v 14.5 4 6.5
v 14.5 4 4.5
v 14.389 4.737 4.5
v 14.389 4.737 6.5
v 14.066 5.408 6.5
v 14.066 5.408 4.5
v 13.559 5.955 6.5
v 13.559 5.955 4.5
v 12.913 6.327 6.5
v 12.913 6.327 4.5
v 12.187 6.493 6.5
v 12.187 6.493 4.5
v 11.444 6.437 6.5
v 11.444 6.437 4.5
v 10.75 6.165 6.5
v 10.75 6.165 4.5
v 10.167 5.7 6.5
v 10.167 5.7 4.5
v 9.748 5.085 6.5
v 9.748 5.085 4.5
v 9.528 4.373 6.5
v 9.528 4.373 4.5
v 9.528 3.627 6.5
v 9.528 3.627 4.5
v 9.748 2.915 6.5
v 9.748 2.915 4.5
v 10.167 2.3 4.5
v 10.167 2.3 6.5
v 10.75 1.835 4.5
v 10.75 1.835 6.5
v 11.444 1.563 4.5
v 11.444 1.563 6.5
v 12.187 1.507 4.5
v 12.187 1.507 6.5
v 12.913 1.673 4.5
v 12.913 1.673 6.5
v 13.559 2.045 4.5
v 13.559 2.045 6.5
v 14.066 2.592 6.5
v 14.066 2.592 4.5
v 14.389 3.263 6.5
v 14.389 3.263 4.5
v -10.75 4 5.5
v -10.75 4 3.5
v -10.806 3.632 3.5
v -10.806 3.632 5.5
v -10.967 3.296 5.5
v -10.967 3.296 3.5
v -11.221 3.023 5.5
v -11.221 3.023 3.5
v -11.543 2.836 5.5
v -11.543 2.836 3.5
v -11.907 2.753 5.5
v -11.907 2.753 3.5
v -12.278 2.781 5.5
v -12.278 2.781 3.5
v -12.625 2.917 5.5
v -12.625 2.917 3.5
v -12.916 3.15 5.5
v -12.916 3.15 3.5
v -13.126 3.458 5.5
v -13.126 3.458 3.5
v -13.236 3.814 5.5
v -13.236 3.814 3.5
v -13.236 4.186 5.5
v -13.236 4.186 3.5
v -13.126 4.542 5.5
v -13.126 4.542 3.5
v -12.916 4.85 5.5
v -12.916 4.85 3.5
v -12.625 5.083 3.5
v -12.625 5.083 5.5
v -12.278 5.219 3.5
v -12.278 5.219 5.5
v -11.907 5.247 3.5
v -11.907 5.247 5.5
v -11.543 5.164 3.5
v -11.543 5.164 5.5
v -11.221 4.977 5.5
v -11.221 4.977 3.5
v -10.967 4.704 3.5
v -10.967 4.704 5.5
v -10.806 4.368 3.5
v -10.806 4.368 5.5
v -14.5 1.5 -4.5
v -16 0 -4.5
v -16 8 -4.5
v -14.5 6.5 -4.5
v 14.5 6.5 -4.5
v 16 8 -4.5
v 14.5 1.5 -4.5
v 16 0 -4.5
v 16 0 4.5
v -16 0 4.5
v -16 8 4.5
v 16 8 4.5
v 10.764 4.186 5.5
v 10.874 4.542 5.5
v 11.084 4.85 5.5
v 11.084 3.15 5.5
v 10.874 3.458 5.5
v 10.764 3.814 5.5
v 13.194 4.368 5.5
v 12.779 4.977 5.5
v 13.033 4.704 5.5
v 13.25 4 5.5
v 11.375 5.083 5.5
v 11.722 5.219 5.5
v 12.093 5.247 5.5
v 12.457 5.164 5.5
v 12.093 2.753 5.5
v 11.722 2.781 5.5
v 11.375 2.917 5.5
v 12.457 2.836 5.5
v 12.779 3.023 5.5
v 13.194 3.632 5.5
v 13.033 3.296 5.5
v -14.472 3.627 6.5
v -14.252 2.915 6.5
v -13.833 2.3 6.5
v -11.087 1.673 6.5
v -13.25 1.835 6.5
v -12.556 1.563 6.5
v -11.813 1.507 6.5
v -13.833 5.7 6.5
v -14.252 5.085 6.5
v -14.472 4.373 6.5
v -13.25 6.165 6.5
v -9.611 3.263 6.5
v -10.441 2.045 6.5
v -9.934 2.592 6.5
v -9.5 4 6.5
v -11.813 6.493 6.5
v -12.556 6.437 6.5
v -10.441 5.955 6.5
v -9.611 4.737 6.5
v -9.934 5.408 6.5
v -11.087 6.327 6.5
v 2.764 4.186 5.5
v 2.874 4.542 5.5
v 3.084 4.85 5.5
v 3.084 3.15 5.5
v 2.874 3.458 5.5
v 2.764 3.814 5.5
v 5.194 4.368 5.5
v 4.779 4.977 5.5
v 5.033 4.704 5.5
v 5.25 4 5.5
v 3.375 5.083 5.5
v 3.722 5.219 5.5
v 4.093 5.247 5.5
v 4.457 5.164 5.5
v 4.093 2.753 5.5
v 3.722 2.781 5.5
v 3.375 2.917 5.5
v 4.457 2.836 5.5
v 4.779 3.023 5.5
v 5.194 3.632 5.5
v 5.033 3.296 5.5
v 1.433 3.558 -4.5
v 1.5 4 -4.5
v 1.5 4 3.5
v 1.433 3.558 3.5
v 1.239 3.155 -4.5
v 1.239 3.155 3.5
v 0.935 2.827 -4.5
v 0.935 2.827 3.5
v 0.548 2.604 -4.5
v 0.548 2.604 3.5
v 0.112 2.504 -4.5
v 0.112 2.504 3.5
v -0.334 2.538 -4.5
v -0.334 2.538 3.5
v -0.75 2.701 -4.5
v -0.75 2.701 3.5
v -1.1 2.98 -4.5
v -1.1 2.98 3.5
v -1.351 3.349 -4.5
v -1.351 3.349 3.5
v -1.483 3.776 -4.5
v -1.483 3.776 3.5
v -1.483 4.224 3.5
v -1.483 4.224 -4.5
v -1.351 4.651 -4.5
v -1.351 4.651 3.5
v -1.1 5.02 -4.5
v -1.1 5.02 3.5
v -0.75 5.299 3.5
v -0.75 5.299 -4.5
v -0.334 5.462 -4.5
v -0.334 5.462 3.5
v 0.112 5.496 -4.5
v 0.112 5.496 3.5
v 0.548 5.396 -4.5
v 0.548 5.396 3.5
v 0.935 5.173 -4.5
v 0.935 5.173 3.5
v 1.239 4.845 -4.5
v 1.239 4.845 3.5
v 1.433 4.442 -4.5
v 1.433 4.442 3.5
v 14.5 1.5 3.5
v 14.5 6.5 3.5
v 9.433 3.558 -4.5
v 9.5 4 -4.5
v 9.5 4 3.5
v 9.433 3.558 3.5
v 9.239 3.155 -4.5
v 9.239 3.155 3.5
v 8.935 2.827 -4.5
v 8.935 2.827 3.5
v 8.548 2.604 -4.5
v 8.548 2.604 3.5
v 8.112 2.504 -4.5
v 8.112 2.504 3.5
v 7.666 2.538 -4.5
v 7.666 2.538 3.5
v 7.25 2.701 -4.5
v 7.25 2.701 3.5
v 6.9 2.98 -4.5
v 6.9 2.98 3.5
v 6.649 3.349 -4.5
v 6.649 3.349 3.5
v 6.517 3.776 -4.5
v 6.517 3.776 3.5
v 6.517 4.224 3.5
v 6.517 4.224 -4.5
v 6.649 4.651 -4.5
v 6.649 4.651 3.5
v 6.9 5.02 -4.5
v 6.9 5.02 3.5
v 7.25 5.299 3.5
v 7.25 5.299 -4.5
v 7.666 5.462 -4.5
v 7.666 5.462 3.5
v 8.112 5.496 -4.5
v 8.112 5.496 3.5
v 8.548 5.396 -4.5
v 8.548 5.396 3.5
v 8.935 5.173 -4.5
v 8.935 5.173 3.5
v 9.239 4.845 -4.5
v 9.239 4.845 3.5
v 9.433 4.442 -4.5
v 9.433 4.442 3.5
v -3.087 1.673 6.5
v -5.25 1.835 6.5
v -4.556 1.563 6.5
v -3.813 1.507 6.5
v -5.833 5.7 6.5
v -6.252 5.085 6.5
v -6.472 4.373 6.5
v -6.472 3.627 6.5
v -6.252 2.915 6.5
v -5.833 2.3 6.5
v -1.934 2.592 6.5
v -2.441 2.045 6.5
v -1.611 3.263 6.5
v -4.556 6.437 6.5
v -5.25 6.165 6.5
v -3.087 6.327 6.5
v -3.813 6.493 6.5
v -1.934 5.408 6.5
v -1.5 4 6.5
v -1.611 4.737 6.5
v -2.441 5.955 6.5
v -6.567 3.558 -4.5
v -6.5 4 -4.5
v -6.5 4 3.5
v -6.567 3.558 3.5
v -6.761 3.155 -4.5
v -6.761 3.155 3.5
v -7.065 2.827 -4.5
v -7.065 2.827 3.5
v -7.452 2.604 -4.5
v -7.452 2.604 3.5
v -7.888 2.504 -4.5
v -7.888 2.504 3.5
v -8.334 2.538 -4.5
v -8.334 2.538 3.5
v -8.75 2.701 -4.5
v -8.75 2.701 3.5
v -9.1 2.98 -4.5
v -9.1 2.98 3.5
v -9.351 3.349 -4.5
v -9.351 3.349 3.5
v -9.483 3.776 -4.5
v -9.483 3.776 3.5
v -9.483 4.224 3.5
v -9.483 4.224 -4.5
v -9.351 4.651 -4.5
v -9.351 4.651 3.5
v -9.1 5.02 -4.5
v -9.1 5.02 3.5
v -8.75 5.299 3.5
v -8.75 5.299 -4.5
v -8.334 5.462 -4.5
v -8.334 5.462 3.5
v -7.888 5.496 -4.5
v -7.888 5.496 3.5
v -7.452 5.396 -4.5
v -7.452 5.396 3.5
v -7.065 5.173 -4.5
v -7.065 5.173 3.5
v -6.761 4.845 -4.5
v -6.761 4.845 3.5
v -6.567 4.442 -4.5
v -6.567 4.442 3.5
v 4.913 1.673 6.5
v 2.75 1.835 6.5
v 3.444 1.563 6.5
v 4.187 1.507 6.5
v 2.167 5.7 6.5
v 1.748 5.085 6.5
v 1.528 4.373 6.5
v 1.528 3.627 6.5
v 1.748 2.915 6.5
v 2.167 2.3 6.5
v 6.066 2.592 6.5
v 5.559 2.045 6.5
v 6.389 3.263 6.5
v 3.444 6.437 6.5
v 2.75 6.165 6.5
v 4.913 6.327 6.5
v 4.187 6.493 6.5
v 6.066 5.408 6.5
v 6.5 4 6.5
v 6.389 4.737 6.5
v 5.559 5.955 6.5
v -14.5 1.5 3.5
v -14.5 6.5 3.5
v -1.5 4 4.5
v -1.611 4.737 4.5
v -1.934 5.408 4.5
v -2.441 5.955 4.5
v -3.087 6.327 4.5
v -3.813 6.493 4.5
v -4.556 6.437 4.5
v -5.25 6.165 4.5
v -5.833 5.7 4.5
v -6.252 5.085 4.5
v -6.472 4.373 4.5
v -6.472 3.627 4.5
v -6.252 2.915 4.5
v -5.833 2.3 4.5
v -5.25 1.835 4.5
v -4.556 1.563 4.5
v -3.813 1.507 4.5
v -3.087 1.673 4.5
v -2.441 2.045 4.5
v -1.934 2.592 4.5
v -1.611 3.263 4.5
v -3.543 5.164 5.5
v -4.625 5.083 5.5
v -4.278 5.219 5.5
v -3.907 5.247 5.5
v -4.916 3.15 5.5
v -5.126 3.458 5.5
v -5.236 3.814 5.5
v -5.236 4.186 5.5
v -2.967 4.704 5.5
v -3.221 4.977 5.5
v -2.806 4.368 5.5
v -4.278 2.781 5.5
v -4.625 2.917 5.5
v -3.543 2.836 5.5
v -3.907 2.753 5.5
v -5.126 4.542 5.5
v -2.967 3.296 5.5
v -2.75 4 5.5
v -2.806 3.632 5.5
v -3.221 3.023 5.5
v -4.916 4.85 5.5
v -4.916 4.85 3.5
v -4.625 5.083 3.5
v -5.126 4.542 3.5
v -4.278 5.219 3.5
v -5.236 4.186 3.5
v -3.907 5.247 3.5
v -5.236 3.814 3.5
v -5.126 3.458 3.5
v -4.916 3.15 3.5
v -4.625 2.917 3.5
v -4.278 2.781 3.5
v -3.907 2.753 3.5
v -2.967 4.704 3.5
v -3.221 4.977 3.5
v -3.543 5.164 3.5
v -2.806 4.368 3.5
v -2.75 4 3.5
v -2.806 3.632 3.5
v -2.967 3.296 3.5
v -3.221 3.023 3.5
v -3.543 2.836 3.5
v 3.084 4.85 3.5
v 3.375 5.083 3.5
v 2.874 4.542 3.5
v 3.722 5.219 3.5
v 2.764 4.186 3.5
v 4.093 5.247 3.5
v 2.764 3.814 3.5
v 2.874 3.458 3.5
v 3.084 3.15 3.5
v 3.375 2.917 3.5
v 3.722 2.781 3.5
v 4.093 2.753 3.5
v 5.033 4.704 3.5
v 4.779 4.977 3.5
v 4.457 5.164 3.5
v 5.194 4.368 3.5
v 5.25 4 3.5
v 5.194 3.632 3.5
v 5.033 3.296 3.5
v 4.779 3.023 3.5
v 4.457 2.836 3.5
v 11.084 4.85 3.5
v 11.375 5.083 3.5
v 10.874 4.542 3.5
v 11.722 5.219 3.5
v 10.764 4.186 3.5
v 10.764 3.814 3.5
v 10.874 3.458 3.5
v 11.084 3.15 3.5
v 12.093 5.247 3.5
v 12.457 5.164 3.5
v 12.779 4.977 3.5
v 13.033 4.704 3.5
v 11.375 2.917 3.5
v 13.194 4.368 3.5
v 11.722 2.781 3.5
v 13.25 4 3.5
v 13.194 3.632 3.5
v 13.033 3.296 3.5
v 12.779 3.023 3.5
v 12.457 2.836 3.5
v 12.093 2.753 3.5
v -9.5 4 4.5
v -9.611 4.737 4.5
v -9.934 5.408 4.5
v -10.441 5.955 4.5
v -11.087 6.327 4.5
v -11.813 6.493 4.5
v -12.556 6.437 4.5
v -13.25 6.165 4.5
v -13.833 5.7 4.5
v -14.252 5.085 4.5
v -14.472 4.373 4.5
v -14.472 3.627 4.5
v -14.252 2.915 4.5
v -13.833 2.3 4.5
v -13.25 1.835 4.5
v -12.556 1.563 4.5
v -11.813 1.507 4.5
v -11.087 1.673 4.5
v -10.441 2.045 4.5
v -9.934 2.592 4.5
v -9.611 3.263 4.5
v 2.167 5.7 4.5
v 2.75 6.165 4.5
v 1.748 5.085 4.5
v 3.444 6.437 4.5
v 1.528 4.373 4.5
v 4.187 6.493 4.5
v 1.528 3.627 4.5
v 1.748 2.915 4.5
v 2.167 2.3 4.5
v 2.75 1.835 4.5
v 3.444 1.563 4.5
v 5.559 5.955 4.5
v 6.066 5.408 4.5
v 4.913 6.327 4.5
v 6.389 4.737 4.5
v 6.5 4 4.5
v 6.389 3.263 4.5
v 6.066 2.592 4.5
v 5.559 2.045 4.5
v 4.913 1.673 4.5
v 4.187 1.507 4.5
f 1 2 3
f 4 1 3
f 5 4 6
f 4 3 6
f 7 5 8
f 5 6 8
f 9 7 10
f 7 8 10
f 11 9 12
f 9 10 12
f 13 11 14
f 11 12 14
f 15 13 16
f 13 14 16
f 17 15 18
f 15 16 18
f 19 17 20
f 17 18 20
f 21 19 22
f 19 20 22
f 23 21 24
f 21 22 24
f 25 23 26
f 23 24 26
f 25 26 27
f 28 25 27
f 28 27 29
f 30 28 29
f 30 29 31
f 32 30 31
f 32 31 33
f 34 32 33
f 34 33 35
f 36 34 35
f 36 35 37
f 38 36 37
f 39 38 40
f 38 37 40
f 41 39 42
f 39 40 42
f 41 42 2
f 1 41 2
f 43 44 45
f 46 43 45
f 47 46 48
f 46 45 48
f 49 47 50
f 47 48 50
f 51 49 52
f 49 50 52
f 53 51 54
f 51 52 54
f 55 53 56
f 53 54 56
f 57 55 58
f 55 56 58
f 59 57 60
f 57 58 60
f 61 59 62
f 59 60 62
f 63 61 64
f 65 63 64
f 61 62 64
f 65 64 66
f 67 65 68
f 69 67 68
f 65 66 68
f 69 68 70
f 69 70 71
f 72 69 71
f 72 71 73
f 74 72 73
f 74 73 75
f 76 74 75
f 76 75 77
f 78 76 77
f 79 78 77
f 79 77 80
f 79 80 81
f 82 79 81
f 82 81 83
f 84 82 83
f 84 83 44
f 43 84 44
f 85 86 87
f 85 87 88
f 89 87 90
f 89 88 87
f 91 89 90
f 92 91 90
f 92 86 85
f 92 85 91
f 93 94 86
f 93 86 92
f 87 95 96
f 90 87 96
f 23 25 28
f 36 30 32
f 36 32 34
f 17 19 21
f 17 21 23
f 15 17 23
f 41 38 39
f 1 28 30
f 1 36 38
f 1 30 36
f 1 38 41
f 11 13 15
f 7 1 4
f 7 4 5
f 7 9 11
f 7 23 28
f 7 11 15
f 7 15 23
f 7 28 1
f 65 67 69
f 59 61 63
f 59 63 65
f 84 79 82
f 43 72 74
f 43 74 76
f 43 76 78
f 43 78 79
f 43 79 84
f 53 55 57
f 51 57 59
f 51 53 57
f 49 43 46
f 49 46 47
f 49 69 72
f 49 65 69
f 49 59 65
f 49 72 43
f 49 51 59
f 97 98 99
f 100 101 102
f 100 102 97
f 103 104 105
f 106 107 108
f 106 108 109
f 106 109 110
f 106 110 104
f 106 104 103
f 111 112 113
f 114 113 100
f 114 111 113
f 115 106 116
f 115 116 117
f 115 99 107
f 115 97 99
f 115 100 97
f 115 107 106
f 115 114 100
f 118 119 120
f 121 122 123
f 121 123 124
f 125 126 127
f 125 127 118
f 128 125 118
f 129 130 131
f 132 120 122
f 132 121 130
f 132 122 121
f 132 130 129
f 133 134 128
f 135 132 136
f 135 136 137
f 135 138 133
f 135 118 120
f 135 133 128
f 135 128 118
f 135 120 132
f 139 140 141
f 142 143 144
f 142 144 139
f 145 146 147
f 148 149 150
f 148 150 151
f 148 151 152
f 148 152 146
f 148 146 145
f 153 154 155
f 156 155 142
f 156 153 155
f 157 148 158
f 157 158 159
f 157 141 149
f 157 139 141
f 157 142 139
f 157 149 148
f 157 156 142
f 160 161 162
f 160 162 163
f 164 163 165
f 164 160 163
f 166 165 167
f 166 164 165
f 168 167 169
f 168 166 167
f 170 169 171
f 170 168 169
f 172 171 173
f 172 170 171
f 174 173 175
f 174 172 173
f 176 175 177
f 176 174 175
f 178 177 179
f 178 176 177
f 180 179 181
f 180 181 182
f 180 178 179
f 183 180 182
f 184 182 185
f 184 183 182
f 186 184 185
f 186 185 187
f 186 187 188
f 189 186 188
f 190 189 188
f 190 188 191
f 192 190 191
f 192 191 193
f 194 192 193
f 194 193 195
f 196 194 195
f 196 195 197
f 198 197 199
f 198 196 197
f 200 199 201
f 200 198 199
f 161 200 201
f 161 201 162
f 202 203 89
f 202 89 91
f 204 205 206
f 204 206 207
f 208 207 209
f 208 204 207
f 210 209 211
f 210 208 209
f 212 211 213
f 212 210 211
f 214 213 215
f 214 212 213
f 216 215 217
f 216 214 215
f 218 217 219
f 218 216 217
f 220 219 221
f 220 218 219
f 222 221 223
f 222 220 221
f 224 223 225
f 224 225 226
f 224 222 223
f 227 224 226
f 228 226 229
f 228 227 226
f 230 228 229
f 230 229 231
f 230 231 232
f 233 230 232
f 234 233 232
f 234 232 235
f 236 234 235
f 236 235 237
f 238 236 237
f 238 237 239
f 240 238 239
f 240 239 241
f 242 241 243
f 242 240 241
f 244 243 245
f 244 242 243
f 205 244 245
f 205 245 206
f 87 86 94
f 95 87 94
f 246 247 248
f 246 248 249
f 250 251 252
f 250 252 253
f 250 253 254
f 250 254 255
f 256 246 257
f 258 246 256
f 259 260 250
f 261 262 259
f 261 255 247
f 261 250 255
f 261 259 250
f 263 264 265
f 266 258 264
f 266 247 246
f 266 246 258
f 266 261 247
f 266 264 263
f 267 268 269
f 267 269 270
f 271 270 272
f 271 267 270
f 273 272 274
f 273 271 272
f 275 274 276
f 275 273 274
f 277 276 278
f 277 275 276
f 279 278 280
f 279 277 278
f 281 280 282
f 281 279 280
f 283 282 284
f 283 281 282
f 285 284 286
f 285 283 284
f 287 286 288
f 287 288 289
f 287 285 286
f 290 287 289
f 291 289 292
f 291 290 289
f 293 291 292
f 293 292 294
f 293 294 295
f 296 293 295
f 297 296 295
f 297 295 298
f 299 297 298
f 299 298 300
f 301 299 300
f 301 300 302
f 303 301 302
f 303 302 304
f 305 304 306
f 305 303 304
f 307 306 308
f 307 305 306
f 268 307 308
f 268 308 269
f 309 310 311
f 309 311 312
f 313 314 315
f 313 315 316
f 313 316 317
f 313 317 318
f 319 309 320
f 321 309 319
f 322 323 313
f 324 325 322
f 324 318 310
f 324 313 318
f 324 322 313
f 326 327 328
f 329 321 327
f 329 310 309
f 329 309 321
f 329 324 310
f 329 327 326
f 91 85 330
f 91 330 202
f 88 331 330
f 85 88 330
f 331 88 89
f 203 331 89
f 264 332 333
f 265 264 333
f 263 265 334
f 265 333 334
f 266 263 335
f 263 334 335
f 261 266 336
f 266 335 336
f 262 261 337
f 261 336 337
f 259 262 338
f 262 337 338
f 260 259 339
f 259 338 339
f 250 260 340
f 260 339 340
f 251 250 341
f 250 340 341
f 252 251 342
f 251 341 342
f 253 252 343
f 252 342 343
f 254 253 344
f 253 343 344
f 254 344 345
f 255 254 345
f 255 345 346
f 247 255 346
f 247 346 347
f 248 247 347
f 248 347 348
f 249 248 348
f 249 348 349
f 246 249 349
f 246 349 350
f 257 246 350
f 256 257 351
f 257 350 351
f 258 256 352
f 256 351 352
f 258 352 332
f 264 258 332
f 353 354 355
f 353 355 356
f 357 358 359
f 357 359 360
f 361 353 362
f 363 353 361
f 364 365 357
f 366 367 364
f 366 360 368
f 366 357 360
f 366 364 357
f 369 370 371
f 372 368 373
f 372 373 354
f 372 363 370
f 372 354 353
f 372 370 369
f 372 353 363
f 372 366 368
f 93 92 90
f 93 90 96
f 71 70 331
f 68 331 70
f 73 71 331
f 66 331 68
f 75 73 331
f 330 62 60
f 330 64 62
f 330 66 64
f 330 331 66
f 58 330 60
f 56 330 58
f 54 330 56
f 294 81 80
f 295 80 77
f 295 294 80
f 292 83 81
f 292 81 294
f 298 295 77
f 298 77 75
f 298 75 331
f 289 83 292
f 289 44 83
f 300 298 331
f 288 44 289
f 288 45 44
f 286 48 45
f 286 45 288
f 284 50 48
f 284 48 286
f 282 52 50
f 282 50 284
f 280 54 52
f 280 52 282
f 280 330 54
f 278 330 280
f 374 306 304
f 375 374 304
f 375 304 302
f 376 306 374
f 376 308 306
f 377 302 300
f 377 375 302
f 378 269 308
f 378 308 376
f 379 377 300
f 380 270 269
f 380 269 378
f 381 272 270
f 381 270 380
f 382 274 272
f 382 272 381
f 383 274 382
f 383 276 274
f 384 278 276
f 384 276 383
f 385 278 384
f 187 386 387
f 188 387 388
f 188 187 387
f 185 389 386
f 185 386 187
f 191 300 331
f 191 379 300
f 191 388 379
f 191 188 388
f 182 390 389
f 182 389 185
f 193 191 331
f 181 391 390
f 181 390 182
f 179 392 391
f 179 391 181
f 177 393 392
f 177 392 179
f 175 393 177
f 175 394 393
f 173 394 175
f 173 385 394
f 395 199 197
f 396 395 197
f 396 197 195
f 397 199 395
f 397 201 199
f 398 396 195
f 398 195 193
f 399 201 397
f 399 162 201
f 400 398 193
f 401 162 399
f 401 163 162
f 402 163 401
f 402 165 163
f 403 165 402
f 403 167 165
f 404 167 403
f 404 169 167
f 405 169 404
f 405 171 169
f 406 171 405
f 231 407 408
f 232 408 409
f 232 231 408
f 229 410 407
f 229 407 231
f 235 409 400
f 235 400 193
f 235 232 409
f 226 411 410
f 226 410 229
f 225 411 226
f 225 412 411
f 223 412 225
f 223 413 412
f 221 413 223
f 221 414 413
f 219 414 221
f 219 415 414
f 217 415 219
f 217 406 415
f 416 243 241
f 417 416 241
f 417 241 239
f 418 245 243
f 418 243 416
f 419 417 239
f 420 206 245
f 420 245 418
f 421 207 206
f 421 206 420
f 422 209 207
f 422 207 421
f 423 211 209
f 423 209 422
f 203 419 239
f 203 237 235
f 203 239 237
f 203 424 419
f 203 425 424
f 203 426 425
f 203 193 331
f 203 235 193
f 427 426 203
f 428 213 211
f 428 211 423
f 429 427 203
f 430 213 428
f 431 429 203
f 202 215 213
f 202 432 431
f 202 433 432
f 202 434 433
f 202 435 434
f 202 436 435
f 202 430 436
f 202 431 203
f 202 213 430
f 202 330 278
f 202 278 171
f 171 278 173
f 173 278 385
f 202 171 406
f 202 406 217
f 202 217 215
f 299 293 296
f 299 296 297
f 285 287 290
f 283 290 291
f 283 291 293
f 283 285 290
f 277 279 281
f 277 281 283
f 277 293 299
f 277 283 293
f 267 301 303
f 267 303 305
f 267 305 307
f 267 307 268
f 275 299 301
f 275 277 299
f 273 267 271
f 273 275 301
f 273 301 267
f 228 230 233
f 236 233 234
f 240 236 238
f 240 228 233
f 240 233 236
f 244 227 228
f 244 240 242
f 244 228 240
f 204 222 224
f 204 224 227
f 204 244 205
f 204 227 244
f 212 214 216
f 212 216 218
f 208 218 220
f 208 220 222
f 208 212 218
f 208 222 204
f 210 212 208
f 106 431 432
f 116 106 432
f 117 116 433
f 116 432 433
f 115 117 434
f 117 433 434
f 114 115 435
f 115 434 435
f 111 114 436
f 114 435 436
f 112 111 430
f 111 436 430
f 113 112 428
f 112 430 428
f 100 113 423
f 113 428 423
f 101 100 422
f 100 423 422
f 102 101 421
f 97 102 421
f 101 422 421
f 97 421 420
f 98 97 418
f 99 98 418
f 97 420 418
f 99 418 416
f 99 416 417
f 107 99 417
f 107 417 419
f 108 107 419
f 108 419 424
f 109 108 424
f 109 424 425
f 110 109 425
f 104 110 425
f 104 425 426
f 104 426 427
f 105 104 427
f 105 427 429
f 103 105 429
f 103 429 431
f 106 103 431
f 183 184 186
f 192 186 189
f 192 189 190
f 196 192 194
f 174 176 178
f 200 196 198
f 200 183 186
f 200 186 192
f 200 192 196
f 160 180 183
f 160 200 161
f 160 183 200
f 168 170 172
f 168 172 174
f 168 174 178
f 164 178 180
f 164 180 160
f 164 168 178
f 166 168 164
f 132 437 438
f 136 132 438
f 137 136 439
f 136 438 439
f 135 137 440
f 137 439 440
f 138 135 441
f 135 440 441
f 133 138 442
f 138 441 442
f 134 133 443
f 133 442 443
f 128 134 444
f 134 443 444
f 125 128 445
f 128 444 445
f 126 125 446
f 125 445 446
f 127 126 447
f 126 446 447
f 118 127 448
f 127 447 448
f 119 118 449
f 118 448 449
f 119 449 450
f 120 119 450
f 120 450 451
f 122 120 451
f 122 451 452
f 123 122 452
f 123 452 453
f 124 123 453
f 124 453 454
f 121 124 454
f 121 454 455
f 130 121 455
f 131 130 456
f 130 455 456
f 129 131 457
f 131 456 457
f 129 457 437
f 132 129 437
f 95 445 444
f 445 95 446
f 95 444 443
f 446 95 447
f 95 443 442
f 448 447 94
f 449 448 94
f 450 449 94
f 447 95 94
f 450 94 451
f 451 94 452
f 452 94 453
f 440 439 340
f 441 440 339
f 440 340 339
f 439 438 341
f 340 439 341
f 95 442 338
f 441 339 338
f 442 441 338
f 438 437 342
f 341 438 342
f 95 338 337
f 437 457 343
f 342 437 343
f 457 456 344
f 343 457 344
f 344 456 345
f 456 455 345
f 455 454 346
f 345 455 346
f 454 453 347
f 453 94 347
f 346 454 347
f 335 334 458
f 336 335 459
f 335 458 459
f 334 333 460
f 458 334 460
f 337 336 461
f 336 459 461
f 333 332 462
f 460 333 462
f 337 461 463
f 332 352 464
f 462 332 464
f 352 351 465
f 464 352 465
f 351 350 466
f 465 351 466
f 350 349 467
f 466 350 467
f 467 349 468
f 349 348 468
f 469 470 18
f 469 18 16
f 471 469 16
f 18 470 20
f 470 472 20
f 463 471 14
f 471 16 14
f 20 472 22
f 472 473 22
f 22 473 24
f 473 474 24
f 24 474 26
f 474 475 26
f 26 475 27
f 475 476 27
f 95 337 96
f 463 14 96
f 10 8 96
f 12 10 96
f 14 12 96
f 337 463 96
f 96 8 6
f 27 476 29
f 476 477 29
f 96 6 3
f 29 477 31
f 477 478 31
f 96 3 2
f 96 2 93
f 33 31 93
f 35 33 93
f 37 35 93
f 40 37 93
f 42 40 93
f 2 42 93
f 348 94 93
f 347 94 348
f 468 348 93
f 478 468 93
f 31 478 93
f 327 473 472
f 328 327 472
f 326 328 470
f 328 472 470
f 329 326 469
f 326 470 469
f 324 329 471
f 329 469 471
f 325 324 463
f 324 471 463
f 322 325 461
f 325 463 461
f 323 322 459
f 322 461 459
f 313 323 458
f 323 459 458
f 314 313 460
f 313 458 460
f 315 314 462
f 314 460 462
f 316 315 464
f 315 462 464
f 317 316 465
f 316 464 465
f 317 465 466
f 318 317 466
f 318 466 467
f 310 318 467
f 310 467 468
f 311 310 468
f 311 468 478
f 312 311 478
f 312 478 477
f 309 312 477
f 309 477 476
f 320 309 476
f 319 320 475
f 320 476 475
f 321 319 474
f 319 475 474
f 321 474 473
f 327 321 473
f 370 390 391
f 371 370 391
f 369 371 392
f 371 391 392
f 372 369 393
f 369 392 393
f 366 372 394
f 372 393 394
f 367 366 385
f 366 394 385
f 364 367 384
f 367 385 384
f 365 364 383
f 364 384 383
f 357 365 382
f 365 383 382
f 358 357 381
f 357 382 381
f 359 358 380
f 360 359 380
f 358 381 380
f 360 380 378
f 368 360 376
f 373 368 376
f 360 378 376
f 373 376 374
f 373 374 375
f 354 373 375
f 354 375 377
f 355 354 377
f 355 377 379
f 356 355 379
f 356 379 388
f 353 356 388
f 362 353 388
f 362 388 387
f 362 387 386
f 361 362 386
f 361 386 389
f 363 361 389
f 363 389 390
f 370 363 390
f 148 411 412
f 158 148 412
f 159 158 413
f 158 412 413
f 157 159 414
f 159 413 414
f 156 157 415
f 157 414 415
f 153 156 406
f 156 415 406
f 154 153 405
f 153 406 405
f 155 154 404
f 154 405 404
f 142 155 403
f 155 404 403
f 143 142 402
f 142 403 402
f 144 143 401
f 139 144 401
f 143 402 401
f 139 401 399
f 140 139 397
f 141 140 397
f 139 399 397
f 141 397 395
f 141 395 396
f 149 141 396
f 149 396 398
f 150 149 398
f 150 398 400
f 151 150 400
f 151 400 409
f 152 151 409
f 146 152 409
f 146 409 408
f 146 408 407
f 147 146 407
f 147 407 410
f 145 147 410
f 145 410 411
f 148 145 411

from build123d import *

# Parameters (mm, degrees)
F0_W     = 32
F0_H     = 9
F1_DEPTH = 8
F2_R     = 2.5
F3_DEPTH = 2
F4_W     = 29
F4_H     = 5
F4_R     = 1.5
F5_DEPTH = 8
F6_R     = 1.25
F7_DEPTH = 10


with BuildPart() as f1:
    # F0 (on Front) → F1 (new body)
    with BuildSketch(Plane.XZ):
        Rectangle(F0_W, F0_H)
    extrude(amount=-F1_DEPTH)

    # F2 (on face) → F3 (join)
    with BuildSketch(Plane.XY.offset(4.5)):
        with Locations((-12, 4)):
            Circle(F2_R)
        with Locations((-4, 4)):
            Circle(F2_R)
        with Locations((4, 4)):
            Circle(F2_R)
        with Locations((12, 4)):
            Circle(F2_R)
    extrude(amount=F3_DEPTH)

    # F4 (on face) → F5 (cut)
    with BuildSketch(Plane(origin=(0, 0, -4.5), x_dir=(1, 0, 0), z_dir=(0, 0, -1))):
        with Locations((0, -4)):
            Rectangle(F4_W, F4_H)
        with Locations((-8, -4)):
            Circle(F4_R, mode=Mode.SUBTRACT)
        with Locations((0, -4)):
            Circle(F4_R, mode=Mode.SUBTRACT)
        with Locations((8, -4)):
            Circle(F4_R, mode=Mode.SUBTRACT)
    extrude(amount=-F5_DEPTH, mode=Mode.SUBTRACT)

    # F6 (on face) → F7 (cut)
    with BuildSketch(Plane(origin=(0, 0, -4.5), x_dir=(1, 0, 0), z_dir=(0, 0, -1))):
        with Locations((-12, -4)):
            Circle(F6_R)
        with Locations((-4, -4)):
            Circle(F6_R)
        with Locations((4, -4)):
            Circle(F6_R)
        with Locations((12, -4)):
            Circle(F6_R)
    extrude(amount=-F7_DEPTH, mode=Mode.SUBTRACT)


solid = f1.part
